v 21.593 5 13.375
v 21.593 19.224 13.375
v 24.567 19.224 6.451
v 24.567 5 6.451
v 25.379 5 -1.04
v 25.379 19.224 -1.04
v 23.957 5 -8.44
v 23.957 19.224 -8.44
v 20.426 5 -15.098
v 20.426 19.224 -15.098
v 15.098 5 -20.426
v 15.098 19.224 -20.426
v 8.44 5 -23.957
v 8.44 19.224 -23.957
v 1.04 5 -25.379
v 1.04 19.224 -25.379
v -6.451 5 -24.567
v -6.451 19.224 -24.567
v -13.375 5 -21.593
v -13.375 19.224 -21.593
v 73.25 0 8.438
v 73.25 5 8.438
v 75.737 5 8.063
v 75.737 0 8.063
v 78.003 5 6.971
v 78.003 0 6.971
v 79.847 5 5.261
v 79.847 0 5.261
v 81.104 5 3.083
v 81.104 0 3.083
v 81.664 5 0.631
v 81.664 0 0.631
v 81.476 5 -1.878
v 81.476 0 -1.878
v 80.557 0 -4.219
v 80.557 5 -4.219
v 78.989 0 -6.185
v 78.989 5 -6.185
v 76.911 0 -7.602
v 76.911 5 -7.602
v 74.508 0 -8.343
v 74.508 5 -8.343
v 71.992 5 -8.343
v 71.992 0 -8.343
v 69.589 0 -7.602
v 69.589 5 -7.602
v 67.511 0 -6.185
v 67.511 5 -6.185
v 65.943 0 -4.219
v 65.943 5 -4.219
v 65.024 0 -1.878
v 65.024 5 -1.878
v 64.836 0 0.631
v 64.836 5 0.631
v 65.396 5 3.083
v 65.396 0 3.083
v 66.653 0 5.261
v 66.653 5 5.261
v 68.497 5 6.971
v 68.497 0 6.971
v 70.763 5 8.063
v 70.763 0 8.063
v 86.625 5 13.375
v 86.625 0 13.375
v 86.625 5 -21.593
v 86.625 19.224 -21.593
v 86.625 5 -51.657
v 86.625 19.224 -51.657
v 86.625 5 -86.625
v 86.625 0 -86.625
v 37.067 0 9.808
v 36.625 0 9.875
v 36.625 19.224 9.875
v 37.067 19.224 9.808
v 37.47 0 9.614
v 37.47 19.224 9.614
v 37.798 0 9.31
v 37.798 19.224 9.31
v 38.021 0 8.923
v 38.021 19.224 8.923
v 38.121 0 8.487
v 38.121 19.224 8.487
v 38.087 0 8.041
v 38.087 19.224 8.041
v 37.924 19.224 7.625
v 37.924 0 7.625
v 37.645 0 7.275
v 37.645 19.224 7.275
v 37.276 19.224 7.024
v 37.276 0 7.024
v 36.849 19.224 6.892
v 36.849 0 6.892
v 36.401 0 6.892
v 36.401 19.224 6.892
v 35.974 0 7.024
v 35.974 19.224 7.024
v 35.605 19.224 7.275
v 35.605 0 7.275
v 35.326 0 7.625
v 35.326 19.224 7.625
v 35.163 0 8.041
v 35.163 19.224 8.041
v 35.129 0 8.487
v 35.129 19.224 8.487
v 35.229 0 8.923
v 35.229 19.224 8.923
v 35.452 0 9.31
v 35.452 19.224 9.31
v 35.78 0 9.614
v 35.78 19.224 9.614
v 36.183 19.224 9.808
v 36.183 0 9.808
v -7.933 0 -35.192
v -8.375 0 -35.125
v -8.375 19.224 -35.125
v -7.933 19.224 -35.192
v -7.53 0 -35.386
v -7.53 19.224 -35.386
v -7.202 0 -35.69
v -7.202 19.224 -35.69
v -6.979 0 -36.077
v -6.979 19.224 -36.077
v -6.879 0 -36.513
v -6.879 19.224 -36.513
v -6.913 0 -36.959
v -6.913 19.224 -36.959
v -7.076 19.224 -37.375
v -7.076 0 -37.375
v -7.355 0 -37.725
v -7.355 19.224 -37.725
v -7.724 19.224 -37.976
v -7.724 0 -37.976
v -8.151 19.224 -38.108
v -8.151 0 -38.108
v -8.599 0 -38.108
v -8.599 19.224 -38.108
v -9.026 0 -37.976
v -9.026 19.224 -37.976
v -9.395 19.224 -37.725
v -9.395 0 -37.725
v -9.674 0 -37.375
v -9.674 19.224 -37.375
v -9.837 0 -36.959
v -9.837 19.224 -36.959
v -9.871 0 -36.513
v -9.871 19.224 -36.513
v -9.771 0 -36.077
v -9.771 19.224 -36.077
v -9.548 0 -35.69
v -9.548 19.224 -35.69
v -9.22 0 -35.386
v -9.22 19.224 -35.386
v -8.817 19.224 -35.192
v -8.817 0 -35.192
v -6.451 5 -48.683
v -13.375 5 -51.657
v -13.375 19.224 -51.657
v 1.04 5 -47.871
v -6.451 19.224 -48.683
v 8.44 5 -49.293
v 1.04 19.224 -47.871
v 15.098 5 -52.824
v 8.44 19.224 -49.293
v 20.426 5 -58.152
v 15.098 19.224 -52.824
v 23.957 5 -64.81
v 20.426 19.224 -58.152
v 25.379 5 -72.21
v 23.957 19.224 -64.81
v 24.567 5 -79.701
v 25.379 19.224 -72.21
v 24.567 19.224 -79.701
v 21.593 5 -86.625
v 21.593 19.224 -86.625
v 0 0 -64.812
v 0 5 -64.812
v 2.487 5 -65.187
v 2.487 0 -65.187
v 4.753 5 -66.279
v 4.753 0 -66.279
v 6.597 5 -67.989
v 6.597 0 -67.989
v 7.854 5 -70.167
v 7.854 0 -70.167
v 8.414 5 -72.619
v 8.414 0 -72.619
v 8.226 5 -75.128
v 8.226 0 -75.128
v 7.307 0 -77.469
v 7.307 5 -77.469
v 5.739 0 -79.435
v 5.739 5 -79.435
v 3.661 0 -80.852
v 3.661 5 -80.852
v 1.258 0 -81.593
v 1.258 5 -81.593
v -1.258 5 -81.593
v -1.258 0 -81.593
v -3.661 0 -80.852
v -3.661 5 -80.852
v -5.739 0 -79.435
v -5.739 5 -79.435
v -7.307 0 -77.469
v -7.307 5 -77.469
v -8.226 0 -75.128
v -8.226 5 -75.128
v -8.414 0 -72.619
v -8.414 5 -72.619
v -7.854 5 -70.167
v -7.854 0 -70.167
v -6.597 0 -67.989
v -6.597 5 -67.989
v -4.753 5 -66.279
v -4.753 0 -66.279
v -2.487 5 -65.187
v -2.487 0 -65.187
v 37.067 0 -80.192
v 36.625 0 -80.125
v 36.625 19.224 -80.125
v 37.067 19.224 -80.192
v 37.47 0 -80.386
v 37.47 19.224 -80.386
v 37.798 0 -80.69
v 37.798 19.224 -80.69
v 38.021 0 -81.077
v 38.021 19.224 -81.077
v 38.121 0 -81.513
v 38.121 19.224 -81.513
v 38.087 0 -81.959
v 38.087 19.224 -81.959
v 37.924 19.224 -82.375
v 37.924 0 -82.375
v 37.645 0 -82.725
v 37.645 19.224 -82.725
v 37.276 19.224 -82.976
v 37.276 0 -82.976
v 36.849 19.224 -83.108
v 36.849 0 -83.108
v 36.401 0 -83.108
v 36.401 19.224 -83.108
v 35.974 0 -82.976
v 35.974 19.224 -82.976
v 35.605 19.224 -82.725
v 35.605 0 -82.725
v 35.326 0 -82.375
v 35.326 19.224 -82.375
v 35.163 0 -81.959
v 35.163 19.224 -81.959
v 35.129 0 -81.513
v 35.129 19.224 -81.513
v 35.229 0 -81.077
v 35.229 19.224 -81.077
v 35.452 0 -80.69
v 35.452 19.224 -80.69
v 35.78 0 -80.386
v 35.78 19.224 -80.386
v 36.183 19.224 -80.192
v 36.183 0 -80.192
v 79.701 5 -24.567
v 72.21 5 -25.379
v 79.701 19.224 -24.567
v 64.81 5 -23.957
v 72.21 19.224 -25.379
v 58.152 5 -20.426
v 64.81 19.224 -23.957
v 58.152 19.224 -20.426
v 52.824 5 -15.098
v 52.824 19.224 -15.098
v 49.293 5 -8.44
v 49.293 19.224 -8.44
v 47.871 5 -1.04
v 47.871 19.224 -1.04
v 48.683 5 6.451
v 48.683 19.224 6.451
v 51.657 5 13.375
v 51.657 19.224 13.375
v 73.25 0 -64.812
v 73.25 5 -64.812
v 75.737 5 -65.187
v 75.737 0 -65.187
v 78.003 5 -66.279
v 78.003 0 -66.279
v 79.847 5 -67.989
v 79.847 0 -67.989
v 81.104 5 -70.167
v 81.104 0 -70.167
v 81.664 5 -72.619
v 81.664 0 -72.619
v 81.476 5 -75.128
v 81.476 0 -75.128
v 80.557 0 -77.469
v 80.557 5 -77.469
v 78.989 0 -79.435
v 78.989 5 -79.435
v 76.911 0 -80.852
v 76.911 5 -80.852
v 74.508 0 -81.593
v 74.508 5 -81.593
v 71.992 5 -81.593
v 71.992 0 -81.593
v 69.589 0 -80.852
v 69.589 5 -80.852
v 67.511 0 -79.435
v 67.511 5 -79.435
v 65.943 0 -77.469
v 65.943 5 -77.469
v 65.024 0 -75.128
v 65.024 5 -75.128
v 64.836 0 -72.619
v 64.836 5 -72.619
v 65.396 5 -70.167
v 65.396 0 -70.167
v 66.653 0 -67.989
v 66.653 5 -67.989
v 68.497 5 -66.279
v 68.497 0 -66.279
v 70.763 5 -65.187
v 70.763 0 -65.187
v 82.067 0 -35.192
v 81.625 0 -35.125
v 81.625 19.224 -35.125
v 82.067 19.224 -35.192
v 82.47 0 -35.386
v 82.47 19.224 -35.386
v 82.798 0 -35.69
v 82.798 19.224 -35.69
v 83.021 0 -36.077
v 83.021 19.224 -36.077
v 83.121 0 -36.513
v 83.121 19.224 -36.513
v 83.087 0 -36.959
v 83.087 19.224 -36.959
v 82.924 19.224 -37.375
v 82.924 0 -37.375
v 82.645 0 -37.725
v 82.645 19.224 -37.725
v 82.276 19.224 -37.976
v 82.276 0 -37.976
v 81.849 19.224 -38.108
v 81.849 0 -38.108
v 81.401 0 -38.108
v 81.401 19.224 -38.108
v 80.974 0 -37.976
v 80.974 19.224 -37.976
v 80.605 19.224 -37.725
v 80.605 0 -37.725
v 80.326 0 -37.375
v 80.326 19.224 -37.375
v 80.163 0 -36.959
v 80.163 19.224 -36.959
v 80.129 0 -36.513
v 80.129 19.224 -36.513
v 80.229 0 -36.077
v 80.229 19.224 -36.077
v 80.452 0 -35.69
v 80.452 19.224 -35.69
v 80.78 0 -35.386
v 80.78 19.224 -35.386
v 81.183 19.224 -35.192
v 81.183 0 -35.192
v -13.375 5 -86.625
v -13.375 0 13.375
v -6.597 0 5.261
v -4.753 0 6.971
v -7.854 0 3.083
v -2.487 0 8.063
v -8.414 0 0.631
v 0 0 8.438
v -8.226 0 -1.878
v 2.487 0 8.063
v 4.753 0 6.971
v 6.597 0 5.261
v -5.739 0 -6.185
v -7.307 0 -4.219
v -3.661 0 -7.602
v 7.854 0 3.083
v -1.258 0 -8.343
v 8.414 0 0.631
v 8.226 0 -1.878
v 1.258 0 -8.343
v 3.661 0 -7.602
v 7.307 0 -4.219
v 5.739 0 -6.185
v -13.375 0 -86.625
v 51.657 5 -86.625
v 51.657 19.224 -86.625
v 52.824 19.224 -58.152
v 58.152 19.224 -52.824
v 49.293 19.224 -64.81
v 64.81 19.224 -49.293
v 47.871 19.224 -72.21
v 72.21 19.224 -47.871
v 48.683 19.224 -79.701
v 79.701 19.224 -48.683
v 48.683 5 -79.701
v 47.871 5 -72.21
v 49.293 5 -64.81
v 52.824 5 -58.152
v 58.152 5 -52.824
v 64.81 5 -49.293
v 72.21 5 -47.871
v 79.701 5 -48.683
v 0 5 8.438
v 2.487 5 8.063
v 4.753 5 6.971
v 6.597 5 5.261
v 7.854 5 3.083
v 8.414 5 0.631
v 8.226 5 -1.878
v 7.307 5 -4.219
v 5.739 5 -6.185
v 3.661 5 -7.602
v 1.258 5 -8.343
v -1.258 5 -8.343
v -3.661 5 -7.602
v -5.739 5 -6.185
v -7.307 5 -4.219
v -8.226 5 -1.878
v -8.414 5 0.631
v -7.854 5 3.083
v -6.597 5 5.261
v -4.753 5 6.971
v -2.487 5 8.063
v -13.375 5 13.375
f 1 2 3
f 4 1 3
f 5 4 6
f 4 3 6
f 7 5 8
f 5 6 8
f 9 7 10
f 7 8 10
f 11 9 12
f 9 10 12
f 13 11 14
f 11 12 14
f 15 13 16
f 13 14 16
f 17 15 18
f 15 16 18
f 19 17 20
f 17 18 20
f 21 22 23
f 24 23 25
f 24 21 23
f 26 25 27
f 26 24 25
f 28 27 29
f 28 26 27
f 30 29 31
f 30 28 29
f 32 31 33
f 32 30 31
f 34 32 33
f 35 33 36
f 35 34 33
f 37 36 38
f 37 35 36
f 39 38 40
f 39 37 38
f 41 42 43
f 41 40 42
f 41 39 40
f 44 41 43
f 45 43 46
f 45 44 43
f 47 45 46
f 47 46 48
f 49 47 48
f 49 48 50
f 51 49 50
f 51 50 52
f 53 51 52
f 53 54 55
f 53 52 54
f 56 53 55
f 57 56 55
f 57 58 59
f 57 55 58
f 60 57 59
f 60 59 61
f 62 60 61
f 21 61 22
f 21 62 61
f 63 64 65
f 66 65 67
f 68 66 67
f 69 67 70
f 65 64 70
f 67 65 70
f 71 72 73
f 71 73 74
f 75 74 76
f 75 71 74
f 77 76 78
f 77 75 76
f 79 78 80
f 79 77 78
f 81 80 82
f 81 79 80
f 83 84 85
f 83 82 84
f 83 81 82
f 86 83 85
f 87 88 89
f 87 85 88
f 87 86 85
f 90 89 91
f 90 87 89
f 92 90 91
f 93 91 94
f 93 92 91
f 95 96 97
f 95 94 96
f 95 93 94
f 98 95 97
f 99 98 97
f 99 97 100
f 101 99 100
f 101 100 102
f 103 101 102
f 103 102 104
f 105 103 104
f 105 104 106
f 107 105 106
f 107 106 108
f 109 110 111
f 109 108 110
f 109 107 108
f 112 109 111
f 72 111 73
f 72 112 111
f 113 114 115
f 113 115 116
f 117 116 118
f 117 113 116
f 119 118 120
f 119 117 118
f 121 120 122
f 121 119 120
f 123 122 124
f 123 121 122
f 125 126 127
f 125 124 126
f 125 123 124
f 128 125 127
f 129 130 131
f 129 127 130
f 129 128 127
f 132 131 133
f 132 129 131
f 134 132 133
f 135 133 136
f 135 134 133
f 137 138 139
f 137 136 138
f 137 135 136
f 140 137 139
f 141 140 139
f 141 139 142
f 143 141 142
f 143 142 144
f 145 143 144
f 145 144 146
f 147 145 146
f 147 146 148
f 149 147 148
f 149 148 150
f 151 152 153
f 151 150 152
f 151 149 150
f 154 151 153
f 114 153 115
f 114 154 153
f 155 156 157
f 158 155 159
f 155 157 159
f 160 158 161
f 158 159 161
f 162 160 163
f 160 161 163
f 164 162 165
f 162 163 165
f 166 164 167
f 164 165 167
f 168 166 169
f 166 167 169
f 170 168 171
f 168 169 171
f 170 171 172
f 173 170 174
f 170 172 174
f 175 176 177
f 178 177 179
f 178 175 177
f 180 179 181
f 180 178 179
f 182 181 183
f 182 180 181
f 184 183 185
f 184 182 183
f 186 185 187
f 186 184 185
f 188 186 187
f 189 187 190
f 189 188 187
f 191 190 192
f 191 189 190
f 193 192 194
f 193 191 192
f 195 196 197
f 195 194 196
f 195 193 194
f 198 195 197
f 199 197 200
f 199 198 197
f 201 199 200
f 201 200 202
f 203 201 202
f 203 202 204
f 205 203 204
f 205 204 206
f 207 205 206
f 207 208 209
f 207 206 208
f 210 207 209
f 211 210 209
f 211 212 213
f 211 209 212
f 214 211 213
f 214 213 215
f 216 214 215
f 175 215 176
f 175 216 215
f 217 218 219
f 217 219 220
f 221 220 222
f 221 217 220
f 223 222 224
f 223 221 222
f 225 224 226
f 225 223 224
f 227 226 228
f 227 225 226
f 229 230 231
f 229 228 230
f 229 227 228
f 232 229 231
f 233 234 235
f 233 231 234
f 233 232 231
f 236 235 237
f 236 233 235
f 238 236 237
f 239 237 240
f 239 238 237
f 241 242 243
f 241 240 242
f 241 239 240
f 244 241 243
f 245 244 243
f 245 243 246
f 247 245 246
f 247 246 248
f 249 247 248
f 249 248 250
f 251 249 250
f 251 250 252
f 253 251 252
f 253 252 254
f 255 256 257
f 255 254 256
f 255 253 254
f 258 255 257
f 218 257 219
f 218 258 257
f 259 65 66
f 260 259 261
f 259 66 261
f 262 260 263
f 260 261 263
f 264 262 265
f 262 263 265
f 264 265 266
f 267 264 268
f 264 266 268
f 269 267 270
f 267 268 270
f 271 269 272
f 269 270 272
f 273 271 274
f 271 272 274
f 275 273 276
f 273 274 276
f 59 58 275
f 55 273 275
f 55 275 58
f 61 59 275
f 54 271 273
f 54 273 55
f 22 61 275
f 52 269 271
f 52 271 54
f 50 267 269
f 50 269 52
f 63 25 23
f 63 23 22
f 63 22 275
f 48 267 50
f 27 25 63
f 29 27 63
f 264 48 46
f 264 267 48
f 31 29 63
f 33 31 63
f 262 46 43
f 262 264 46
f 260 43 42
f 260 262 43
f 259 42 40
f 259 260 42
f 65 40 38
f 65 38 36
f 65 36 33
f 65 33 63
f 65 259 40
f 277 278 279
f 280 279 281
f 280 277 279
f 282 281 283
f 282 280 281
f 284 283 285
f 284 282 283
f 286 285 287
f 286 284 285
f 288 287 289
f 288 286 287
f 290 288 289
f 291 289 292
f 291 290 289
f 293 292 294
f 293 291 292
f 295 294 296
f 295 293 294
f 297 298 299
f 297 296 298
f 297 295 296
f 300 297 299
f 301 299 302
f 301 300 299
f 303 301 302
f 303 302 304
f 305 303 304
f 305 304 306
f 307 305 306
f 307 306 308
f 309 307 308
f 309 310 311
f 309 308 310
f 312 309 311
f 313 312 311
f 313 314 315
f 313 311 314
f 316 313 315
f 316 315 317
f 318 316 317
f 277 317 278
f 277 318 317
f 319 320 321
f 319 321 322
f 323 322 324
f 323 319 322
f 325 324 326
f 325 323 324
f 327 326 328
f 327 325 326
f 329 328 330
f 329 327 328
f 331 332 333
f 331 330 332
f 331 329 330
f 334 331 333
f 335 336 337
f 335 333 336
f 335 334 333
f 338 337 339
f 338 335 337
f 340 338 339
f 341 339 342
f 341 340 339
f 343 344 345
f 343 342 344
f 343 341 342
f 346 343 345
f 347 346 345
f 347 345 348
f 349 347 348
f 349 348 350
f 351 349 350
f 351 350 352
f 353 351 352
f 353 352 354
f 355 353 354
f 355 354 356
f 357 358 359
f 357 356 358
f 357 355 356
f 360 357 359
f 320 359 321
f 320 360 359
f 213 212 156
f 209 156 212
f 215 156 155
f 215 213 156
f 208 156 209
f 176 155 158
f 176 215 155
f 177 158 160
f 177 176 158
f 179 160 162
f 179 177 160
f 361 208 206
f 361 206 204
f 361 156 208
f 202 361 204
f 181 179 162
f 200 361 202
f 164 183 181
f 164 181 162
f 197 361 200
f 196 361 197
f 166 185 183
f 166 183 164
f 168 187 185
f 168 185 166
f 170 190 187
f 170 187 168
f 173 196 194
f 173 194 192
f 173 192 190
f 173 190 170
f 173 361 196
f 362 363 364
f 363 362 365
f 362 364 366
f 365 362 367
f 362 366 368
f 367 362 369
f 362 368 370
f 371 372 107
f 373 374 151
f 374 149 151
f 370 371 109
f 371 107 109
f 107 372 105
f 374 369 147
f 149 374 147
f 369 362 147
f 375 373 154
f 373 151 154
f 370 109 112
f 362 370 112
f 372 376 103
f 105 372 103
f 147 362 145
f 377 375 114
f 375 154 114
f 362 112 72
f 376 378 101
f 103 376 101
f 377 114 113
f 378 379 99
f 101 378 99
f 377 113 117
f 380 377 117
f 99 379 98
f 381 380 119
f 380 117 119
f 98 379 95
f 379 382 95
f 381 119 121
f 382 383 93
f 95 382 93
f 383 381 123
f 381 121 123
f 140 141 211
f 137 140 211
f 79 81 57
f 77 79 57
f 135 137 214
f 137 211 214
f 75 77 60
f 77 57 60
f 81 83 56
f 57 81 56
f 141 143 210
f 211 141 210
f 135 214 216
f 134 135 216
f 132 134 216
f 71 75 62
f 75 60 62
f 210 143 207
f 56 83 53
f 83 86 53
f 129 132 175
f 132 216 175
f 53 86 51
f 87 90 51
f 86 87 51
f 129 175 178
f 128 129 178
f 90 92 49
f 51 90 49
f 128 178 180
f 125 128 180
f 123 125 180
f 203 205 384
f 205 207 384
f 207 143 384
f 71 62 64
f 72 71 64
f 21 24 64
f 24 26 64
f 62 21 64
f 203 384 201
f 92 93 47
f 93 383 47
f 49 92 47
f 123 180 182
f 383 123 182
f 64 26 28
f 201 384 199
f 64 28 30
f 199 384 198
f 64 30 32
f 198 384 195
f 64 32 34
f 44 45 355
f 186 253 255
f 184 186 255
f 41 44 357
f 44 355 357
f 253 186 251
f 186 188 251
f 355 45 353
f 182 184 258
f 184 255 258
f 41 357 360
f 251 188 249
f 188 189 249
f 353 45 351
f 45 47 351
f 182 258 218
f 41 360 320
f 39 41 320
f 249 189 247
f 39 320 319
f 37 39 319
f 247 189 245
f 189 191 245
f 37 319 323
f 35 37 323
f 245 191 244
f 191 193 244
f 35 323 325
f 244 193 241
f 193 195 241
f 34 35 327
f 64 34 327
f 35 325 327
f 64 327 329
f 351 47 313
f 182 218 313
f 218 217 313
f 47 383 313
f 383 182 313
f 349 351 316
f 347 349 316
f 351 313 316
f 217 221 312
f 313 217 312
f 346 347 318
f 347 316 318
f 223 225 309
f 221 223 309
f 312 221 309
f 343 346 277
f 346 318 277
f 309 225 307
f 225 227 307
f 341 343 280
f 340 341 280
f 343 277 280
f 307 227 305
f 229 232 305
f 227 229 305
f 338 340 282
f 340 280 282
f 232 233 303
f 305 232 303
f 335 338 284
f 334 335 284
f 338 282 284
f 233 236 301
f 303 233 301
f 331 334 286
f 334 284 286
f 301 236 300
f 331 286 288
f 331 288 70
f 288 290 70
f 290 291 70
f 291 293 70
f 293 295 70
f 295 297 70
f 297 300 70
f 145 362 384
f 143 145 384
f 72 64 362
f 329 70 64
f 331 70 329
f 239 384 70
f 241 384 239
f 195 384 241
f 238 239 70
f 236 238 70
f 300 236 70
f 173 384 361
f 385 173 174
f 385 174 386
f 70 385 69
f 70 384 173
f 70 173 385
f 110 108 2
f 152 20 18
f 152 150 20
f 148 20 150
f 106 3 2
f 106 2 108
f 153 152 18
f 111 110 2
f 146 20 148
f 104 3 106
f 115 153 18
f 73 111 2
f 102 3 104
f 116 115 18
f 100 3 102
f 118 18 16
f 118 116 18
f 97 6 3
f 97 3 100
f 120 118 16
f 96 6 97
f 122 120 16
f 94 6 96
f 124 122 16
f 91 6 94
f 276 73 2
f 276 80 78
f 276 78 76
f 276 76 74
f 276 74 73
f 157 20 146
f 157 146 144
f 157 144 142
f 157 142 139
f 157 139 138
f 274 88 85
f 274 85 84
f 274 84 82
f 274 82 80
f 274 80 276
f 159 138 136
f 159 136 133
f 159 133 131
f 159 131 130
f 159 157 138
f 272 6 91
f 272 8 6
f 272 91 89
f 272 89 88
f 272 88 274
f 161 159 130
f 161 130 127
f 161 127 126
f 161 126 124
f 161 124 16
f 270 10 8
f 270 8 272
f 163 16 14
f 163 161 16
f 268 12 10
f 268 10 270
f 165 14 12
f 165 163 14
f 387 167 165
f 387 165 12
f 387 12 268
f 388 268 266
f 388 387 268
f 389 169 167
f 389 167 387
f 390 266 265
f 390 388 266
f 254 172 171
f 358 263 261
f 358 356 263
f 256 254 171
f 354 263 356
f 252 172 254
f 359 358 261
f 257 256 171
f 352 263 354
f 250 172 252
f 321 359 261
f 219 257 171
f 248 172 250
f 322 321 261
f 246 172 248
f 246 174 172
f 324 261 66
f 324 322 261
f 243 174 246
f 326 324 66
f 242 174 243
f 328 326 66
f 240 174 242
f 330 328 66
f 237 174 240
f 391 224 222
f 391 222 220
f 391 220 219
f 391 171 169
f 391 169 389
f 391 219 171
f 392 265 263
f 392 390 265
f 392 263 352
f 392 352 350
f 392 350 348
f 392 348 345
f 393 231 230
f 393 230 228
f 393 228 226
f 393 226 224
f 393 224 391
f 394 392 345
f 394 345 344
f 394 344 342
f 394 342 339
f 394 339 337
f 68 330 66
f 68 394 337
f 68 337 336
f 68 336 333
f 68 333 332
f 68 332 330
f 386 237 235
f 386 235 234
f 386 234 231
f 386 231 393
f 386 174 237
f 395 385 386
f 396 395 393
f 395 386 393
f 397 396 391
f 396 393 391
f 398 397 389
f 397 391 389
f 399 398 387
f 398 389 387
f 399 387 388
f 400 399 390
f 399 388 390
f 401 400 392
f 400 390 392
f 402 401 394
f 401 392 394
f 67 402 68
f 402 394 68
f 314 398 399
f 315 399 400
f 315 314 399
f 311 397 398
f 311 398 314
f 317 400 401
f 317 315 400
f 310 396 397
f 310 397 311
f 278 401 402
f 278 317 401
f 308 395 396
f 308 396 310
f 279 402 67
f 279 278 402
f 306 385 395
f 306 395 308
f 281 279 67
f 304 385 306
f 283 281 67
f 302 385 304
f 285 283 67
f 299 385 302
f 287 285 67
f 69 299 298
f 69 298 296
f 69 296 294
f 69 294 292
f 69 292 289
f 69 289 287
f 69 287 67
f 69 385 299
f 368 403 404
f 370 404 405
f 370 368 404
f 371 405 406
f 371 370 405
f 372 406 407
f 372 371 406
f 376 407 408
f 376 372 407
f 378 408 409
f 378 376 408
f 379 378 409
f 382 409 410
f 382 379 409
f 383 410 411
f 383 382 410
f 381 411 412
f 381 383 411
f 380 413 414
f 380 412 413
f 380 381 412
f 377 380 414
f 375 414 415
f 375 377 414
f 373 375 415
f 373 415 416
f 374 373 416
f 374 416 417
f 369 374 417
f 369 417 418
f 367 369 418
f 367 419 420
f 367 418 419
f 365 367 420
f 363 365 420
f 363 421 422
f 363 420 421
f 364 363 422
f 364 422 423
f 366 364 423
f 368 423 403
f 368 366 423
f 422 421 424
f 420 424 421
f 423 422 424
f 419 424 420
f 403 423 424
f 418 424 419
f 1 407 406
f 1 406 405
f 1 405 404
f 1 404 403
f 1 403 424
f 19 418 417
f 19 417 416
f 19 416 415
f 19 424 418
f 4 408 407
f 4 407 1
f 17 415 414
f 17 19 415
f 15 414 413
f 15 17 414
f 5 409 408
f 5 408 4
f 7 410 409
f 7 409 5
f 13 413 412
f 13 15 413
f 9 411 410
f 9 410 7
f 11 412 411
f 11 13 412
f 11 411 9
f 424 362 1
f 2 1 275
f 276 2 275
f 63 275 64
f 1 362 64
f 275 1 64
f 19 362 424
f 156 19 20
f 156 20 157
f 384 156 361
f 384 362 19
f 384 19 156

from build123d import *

# Parameters (mm, degrees)
SKETCH1_W               = 100
SKETCH1_H               = 100
SKETCH1_R               = 8.4375
BOSS_EXTRUDE1_DEPTH     = 19.224
SKETCH4_R               = 25.4
CUT_EXTRUDE2_DEPTH      = 14.224
CUT_EXTRUDE1_DEPTH      = 125.005416922
CUT_EXTRUDE1_DEPTH_BACK = 125.005416922
SKETCH3_R               = 1.5


with BuildPart() as part:
    # Sketch1 → Boss-Extrude1 (new body)
    with BuildSketch(Plane(origin=(0, 0, 0), x_dir=(1, 0, 0), z_dir=(0, 1, 0))):
        with Locations((36.625, 36.625)):
            Rectangle(SKETCH1_W, SKETCH1_H)
        with Locations(Location((0, 0, 0), (0, 0, 270))):
            Circle(SKETCH1_R, mode=Mode.SUBTRACT)
        with Locations(Location((0, 73.25, 0), (0, 0, 270))):
            Circle(SKETCH1_R, mode=Mode.SUBTRACT)
        with Locations(Location((73.25, 73.25, 0), (0, 0, 270))):
            Circle(SKETCH1_R, mode=Mode.SUBTRACT)
        with Locations(Location((73.25, 0, 0), (0, 0, 270))):
            Circle(SKETCH1_R, mode=Mode.SUBTRACT)
    extrude(amount=BOSS_EXTRUDE1_DEPTH)

    # Sketch4 → Cut-Extrude2 (cut)
    with BuildSketch(Plane(origin=(0, 19.224, 0), x_dir=(1, 0, 0), z_dir=(0, 1, 0))):
        Circle(SKETCH4_R)
        with Locations((73.25, 0)):
            Circle(SKETCH4_R)
        with Locations((73.25, 73.25)):
            Circle(SKETCH4_R)
        with Locations((0, 73.25)):
            Circle(SKETCH4_R)
    extrude(amount=-CUT_EXTRUDE2_DEPTH, mode=Mode.SUBTRACT)

    # Sketch3 → Cut-Extrude1 (cut, two sides: drawn at the far end of the back side and taken through both)
    with BuildSketch(Plane(origin=(0, 0, 0), x_dir=(1, 0, 0), z_dir=(0, 1, 0)).offset(-CUT_EXTRUDE1_DEPTH_BACK)):
        with Locations(Location((36.625, 81.625, 0), (0, 0, 270))):
            Circle(SKETCH3_R)
        with Locations(Location((81.625, 36.625, 0), (0, 0, 270))):
            Circle(SKETCH3_R)
        with Locations(Location((36.625, -8.375, 0), (0, 0, 270))):
            Circle(SKETCH3_R)
        with Locations(Location((-8.375, 36.625, 0), (0, 0, 270))):
            Circle(SKETCH3_R)
    extrude(amount=CUT_EXTRUDE1_DEPTH + CUT_EXTRUDE1_DEPTH_BACK, mode=Mode.SUBTRACT)


solid = part.part
